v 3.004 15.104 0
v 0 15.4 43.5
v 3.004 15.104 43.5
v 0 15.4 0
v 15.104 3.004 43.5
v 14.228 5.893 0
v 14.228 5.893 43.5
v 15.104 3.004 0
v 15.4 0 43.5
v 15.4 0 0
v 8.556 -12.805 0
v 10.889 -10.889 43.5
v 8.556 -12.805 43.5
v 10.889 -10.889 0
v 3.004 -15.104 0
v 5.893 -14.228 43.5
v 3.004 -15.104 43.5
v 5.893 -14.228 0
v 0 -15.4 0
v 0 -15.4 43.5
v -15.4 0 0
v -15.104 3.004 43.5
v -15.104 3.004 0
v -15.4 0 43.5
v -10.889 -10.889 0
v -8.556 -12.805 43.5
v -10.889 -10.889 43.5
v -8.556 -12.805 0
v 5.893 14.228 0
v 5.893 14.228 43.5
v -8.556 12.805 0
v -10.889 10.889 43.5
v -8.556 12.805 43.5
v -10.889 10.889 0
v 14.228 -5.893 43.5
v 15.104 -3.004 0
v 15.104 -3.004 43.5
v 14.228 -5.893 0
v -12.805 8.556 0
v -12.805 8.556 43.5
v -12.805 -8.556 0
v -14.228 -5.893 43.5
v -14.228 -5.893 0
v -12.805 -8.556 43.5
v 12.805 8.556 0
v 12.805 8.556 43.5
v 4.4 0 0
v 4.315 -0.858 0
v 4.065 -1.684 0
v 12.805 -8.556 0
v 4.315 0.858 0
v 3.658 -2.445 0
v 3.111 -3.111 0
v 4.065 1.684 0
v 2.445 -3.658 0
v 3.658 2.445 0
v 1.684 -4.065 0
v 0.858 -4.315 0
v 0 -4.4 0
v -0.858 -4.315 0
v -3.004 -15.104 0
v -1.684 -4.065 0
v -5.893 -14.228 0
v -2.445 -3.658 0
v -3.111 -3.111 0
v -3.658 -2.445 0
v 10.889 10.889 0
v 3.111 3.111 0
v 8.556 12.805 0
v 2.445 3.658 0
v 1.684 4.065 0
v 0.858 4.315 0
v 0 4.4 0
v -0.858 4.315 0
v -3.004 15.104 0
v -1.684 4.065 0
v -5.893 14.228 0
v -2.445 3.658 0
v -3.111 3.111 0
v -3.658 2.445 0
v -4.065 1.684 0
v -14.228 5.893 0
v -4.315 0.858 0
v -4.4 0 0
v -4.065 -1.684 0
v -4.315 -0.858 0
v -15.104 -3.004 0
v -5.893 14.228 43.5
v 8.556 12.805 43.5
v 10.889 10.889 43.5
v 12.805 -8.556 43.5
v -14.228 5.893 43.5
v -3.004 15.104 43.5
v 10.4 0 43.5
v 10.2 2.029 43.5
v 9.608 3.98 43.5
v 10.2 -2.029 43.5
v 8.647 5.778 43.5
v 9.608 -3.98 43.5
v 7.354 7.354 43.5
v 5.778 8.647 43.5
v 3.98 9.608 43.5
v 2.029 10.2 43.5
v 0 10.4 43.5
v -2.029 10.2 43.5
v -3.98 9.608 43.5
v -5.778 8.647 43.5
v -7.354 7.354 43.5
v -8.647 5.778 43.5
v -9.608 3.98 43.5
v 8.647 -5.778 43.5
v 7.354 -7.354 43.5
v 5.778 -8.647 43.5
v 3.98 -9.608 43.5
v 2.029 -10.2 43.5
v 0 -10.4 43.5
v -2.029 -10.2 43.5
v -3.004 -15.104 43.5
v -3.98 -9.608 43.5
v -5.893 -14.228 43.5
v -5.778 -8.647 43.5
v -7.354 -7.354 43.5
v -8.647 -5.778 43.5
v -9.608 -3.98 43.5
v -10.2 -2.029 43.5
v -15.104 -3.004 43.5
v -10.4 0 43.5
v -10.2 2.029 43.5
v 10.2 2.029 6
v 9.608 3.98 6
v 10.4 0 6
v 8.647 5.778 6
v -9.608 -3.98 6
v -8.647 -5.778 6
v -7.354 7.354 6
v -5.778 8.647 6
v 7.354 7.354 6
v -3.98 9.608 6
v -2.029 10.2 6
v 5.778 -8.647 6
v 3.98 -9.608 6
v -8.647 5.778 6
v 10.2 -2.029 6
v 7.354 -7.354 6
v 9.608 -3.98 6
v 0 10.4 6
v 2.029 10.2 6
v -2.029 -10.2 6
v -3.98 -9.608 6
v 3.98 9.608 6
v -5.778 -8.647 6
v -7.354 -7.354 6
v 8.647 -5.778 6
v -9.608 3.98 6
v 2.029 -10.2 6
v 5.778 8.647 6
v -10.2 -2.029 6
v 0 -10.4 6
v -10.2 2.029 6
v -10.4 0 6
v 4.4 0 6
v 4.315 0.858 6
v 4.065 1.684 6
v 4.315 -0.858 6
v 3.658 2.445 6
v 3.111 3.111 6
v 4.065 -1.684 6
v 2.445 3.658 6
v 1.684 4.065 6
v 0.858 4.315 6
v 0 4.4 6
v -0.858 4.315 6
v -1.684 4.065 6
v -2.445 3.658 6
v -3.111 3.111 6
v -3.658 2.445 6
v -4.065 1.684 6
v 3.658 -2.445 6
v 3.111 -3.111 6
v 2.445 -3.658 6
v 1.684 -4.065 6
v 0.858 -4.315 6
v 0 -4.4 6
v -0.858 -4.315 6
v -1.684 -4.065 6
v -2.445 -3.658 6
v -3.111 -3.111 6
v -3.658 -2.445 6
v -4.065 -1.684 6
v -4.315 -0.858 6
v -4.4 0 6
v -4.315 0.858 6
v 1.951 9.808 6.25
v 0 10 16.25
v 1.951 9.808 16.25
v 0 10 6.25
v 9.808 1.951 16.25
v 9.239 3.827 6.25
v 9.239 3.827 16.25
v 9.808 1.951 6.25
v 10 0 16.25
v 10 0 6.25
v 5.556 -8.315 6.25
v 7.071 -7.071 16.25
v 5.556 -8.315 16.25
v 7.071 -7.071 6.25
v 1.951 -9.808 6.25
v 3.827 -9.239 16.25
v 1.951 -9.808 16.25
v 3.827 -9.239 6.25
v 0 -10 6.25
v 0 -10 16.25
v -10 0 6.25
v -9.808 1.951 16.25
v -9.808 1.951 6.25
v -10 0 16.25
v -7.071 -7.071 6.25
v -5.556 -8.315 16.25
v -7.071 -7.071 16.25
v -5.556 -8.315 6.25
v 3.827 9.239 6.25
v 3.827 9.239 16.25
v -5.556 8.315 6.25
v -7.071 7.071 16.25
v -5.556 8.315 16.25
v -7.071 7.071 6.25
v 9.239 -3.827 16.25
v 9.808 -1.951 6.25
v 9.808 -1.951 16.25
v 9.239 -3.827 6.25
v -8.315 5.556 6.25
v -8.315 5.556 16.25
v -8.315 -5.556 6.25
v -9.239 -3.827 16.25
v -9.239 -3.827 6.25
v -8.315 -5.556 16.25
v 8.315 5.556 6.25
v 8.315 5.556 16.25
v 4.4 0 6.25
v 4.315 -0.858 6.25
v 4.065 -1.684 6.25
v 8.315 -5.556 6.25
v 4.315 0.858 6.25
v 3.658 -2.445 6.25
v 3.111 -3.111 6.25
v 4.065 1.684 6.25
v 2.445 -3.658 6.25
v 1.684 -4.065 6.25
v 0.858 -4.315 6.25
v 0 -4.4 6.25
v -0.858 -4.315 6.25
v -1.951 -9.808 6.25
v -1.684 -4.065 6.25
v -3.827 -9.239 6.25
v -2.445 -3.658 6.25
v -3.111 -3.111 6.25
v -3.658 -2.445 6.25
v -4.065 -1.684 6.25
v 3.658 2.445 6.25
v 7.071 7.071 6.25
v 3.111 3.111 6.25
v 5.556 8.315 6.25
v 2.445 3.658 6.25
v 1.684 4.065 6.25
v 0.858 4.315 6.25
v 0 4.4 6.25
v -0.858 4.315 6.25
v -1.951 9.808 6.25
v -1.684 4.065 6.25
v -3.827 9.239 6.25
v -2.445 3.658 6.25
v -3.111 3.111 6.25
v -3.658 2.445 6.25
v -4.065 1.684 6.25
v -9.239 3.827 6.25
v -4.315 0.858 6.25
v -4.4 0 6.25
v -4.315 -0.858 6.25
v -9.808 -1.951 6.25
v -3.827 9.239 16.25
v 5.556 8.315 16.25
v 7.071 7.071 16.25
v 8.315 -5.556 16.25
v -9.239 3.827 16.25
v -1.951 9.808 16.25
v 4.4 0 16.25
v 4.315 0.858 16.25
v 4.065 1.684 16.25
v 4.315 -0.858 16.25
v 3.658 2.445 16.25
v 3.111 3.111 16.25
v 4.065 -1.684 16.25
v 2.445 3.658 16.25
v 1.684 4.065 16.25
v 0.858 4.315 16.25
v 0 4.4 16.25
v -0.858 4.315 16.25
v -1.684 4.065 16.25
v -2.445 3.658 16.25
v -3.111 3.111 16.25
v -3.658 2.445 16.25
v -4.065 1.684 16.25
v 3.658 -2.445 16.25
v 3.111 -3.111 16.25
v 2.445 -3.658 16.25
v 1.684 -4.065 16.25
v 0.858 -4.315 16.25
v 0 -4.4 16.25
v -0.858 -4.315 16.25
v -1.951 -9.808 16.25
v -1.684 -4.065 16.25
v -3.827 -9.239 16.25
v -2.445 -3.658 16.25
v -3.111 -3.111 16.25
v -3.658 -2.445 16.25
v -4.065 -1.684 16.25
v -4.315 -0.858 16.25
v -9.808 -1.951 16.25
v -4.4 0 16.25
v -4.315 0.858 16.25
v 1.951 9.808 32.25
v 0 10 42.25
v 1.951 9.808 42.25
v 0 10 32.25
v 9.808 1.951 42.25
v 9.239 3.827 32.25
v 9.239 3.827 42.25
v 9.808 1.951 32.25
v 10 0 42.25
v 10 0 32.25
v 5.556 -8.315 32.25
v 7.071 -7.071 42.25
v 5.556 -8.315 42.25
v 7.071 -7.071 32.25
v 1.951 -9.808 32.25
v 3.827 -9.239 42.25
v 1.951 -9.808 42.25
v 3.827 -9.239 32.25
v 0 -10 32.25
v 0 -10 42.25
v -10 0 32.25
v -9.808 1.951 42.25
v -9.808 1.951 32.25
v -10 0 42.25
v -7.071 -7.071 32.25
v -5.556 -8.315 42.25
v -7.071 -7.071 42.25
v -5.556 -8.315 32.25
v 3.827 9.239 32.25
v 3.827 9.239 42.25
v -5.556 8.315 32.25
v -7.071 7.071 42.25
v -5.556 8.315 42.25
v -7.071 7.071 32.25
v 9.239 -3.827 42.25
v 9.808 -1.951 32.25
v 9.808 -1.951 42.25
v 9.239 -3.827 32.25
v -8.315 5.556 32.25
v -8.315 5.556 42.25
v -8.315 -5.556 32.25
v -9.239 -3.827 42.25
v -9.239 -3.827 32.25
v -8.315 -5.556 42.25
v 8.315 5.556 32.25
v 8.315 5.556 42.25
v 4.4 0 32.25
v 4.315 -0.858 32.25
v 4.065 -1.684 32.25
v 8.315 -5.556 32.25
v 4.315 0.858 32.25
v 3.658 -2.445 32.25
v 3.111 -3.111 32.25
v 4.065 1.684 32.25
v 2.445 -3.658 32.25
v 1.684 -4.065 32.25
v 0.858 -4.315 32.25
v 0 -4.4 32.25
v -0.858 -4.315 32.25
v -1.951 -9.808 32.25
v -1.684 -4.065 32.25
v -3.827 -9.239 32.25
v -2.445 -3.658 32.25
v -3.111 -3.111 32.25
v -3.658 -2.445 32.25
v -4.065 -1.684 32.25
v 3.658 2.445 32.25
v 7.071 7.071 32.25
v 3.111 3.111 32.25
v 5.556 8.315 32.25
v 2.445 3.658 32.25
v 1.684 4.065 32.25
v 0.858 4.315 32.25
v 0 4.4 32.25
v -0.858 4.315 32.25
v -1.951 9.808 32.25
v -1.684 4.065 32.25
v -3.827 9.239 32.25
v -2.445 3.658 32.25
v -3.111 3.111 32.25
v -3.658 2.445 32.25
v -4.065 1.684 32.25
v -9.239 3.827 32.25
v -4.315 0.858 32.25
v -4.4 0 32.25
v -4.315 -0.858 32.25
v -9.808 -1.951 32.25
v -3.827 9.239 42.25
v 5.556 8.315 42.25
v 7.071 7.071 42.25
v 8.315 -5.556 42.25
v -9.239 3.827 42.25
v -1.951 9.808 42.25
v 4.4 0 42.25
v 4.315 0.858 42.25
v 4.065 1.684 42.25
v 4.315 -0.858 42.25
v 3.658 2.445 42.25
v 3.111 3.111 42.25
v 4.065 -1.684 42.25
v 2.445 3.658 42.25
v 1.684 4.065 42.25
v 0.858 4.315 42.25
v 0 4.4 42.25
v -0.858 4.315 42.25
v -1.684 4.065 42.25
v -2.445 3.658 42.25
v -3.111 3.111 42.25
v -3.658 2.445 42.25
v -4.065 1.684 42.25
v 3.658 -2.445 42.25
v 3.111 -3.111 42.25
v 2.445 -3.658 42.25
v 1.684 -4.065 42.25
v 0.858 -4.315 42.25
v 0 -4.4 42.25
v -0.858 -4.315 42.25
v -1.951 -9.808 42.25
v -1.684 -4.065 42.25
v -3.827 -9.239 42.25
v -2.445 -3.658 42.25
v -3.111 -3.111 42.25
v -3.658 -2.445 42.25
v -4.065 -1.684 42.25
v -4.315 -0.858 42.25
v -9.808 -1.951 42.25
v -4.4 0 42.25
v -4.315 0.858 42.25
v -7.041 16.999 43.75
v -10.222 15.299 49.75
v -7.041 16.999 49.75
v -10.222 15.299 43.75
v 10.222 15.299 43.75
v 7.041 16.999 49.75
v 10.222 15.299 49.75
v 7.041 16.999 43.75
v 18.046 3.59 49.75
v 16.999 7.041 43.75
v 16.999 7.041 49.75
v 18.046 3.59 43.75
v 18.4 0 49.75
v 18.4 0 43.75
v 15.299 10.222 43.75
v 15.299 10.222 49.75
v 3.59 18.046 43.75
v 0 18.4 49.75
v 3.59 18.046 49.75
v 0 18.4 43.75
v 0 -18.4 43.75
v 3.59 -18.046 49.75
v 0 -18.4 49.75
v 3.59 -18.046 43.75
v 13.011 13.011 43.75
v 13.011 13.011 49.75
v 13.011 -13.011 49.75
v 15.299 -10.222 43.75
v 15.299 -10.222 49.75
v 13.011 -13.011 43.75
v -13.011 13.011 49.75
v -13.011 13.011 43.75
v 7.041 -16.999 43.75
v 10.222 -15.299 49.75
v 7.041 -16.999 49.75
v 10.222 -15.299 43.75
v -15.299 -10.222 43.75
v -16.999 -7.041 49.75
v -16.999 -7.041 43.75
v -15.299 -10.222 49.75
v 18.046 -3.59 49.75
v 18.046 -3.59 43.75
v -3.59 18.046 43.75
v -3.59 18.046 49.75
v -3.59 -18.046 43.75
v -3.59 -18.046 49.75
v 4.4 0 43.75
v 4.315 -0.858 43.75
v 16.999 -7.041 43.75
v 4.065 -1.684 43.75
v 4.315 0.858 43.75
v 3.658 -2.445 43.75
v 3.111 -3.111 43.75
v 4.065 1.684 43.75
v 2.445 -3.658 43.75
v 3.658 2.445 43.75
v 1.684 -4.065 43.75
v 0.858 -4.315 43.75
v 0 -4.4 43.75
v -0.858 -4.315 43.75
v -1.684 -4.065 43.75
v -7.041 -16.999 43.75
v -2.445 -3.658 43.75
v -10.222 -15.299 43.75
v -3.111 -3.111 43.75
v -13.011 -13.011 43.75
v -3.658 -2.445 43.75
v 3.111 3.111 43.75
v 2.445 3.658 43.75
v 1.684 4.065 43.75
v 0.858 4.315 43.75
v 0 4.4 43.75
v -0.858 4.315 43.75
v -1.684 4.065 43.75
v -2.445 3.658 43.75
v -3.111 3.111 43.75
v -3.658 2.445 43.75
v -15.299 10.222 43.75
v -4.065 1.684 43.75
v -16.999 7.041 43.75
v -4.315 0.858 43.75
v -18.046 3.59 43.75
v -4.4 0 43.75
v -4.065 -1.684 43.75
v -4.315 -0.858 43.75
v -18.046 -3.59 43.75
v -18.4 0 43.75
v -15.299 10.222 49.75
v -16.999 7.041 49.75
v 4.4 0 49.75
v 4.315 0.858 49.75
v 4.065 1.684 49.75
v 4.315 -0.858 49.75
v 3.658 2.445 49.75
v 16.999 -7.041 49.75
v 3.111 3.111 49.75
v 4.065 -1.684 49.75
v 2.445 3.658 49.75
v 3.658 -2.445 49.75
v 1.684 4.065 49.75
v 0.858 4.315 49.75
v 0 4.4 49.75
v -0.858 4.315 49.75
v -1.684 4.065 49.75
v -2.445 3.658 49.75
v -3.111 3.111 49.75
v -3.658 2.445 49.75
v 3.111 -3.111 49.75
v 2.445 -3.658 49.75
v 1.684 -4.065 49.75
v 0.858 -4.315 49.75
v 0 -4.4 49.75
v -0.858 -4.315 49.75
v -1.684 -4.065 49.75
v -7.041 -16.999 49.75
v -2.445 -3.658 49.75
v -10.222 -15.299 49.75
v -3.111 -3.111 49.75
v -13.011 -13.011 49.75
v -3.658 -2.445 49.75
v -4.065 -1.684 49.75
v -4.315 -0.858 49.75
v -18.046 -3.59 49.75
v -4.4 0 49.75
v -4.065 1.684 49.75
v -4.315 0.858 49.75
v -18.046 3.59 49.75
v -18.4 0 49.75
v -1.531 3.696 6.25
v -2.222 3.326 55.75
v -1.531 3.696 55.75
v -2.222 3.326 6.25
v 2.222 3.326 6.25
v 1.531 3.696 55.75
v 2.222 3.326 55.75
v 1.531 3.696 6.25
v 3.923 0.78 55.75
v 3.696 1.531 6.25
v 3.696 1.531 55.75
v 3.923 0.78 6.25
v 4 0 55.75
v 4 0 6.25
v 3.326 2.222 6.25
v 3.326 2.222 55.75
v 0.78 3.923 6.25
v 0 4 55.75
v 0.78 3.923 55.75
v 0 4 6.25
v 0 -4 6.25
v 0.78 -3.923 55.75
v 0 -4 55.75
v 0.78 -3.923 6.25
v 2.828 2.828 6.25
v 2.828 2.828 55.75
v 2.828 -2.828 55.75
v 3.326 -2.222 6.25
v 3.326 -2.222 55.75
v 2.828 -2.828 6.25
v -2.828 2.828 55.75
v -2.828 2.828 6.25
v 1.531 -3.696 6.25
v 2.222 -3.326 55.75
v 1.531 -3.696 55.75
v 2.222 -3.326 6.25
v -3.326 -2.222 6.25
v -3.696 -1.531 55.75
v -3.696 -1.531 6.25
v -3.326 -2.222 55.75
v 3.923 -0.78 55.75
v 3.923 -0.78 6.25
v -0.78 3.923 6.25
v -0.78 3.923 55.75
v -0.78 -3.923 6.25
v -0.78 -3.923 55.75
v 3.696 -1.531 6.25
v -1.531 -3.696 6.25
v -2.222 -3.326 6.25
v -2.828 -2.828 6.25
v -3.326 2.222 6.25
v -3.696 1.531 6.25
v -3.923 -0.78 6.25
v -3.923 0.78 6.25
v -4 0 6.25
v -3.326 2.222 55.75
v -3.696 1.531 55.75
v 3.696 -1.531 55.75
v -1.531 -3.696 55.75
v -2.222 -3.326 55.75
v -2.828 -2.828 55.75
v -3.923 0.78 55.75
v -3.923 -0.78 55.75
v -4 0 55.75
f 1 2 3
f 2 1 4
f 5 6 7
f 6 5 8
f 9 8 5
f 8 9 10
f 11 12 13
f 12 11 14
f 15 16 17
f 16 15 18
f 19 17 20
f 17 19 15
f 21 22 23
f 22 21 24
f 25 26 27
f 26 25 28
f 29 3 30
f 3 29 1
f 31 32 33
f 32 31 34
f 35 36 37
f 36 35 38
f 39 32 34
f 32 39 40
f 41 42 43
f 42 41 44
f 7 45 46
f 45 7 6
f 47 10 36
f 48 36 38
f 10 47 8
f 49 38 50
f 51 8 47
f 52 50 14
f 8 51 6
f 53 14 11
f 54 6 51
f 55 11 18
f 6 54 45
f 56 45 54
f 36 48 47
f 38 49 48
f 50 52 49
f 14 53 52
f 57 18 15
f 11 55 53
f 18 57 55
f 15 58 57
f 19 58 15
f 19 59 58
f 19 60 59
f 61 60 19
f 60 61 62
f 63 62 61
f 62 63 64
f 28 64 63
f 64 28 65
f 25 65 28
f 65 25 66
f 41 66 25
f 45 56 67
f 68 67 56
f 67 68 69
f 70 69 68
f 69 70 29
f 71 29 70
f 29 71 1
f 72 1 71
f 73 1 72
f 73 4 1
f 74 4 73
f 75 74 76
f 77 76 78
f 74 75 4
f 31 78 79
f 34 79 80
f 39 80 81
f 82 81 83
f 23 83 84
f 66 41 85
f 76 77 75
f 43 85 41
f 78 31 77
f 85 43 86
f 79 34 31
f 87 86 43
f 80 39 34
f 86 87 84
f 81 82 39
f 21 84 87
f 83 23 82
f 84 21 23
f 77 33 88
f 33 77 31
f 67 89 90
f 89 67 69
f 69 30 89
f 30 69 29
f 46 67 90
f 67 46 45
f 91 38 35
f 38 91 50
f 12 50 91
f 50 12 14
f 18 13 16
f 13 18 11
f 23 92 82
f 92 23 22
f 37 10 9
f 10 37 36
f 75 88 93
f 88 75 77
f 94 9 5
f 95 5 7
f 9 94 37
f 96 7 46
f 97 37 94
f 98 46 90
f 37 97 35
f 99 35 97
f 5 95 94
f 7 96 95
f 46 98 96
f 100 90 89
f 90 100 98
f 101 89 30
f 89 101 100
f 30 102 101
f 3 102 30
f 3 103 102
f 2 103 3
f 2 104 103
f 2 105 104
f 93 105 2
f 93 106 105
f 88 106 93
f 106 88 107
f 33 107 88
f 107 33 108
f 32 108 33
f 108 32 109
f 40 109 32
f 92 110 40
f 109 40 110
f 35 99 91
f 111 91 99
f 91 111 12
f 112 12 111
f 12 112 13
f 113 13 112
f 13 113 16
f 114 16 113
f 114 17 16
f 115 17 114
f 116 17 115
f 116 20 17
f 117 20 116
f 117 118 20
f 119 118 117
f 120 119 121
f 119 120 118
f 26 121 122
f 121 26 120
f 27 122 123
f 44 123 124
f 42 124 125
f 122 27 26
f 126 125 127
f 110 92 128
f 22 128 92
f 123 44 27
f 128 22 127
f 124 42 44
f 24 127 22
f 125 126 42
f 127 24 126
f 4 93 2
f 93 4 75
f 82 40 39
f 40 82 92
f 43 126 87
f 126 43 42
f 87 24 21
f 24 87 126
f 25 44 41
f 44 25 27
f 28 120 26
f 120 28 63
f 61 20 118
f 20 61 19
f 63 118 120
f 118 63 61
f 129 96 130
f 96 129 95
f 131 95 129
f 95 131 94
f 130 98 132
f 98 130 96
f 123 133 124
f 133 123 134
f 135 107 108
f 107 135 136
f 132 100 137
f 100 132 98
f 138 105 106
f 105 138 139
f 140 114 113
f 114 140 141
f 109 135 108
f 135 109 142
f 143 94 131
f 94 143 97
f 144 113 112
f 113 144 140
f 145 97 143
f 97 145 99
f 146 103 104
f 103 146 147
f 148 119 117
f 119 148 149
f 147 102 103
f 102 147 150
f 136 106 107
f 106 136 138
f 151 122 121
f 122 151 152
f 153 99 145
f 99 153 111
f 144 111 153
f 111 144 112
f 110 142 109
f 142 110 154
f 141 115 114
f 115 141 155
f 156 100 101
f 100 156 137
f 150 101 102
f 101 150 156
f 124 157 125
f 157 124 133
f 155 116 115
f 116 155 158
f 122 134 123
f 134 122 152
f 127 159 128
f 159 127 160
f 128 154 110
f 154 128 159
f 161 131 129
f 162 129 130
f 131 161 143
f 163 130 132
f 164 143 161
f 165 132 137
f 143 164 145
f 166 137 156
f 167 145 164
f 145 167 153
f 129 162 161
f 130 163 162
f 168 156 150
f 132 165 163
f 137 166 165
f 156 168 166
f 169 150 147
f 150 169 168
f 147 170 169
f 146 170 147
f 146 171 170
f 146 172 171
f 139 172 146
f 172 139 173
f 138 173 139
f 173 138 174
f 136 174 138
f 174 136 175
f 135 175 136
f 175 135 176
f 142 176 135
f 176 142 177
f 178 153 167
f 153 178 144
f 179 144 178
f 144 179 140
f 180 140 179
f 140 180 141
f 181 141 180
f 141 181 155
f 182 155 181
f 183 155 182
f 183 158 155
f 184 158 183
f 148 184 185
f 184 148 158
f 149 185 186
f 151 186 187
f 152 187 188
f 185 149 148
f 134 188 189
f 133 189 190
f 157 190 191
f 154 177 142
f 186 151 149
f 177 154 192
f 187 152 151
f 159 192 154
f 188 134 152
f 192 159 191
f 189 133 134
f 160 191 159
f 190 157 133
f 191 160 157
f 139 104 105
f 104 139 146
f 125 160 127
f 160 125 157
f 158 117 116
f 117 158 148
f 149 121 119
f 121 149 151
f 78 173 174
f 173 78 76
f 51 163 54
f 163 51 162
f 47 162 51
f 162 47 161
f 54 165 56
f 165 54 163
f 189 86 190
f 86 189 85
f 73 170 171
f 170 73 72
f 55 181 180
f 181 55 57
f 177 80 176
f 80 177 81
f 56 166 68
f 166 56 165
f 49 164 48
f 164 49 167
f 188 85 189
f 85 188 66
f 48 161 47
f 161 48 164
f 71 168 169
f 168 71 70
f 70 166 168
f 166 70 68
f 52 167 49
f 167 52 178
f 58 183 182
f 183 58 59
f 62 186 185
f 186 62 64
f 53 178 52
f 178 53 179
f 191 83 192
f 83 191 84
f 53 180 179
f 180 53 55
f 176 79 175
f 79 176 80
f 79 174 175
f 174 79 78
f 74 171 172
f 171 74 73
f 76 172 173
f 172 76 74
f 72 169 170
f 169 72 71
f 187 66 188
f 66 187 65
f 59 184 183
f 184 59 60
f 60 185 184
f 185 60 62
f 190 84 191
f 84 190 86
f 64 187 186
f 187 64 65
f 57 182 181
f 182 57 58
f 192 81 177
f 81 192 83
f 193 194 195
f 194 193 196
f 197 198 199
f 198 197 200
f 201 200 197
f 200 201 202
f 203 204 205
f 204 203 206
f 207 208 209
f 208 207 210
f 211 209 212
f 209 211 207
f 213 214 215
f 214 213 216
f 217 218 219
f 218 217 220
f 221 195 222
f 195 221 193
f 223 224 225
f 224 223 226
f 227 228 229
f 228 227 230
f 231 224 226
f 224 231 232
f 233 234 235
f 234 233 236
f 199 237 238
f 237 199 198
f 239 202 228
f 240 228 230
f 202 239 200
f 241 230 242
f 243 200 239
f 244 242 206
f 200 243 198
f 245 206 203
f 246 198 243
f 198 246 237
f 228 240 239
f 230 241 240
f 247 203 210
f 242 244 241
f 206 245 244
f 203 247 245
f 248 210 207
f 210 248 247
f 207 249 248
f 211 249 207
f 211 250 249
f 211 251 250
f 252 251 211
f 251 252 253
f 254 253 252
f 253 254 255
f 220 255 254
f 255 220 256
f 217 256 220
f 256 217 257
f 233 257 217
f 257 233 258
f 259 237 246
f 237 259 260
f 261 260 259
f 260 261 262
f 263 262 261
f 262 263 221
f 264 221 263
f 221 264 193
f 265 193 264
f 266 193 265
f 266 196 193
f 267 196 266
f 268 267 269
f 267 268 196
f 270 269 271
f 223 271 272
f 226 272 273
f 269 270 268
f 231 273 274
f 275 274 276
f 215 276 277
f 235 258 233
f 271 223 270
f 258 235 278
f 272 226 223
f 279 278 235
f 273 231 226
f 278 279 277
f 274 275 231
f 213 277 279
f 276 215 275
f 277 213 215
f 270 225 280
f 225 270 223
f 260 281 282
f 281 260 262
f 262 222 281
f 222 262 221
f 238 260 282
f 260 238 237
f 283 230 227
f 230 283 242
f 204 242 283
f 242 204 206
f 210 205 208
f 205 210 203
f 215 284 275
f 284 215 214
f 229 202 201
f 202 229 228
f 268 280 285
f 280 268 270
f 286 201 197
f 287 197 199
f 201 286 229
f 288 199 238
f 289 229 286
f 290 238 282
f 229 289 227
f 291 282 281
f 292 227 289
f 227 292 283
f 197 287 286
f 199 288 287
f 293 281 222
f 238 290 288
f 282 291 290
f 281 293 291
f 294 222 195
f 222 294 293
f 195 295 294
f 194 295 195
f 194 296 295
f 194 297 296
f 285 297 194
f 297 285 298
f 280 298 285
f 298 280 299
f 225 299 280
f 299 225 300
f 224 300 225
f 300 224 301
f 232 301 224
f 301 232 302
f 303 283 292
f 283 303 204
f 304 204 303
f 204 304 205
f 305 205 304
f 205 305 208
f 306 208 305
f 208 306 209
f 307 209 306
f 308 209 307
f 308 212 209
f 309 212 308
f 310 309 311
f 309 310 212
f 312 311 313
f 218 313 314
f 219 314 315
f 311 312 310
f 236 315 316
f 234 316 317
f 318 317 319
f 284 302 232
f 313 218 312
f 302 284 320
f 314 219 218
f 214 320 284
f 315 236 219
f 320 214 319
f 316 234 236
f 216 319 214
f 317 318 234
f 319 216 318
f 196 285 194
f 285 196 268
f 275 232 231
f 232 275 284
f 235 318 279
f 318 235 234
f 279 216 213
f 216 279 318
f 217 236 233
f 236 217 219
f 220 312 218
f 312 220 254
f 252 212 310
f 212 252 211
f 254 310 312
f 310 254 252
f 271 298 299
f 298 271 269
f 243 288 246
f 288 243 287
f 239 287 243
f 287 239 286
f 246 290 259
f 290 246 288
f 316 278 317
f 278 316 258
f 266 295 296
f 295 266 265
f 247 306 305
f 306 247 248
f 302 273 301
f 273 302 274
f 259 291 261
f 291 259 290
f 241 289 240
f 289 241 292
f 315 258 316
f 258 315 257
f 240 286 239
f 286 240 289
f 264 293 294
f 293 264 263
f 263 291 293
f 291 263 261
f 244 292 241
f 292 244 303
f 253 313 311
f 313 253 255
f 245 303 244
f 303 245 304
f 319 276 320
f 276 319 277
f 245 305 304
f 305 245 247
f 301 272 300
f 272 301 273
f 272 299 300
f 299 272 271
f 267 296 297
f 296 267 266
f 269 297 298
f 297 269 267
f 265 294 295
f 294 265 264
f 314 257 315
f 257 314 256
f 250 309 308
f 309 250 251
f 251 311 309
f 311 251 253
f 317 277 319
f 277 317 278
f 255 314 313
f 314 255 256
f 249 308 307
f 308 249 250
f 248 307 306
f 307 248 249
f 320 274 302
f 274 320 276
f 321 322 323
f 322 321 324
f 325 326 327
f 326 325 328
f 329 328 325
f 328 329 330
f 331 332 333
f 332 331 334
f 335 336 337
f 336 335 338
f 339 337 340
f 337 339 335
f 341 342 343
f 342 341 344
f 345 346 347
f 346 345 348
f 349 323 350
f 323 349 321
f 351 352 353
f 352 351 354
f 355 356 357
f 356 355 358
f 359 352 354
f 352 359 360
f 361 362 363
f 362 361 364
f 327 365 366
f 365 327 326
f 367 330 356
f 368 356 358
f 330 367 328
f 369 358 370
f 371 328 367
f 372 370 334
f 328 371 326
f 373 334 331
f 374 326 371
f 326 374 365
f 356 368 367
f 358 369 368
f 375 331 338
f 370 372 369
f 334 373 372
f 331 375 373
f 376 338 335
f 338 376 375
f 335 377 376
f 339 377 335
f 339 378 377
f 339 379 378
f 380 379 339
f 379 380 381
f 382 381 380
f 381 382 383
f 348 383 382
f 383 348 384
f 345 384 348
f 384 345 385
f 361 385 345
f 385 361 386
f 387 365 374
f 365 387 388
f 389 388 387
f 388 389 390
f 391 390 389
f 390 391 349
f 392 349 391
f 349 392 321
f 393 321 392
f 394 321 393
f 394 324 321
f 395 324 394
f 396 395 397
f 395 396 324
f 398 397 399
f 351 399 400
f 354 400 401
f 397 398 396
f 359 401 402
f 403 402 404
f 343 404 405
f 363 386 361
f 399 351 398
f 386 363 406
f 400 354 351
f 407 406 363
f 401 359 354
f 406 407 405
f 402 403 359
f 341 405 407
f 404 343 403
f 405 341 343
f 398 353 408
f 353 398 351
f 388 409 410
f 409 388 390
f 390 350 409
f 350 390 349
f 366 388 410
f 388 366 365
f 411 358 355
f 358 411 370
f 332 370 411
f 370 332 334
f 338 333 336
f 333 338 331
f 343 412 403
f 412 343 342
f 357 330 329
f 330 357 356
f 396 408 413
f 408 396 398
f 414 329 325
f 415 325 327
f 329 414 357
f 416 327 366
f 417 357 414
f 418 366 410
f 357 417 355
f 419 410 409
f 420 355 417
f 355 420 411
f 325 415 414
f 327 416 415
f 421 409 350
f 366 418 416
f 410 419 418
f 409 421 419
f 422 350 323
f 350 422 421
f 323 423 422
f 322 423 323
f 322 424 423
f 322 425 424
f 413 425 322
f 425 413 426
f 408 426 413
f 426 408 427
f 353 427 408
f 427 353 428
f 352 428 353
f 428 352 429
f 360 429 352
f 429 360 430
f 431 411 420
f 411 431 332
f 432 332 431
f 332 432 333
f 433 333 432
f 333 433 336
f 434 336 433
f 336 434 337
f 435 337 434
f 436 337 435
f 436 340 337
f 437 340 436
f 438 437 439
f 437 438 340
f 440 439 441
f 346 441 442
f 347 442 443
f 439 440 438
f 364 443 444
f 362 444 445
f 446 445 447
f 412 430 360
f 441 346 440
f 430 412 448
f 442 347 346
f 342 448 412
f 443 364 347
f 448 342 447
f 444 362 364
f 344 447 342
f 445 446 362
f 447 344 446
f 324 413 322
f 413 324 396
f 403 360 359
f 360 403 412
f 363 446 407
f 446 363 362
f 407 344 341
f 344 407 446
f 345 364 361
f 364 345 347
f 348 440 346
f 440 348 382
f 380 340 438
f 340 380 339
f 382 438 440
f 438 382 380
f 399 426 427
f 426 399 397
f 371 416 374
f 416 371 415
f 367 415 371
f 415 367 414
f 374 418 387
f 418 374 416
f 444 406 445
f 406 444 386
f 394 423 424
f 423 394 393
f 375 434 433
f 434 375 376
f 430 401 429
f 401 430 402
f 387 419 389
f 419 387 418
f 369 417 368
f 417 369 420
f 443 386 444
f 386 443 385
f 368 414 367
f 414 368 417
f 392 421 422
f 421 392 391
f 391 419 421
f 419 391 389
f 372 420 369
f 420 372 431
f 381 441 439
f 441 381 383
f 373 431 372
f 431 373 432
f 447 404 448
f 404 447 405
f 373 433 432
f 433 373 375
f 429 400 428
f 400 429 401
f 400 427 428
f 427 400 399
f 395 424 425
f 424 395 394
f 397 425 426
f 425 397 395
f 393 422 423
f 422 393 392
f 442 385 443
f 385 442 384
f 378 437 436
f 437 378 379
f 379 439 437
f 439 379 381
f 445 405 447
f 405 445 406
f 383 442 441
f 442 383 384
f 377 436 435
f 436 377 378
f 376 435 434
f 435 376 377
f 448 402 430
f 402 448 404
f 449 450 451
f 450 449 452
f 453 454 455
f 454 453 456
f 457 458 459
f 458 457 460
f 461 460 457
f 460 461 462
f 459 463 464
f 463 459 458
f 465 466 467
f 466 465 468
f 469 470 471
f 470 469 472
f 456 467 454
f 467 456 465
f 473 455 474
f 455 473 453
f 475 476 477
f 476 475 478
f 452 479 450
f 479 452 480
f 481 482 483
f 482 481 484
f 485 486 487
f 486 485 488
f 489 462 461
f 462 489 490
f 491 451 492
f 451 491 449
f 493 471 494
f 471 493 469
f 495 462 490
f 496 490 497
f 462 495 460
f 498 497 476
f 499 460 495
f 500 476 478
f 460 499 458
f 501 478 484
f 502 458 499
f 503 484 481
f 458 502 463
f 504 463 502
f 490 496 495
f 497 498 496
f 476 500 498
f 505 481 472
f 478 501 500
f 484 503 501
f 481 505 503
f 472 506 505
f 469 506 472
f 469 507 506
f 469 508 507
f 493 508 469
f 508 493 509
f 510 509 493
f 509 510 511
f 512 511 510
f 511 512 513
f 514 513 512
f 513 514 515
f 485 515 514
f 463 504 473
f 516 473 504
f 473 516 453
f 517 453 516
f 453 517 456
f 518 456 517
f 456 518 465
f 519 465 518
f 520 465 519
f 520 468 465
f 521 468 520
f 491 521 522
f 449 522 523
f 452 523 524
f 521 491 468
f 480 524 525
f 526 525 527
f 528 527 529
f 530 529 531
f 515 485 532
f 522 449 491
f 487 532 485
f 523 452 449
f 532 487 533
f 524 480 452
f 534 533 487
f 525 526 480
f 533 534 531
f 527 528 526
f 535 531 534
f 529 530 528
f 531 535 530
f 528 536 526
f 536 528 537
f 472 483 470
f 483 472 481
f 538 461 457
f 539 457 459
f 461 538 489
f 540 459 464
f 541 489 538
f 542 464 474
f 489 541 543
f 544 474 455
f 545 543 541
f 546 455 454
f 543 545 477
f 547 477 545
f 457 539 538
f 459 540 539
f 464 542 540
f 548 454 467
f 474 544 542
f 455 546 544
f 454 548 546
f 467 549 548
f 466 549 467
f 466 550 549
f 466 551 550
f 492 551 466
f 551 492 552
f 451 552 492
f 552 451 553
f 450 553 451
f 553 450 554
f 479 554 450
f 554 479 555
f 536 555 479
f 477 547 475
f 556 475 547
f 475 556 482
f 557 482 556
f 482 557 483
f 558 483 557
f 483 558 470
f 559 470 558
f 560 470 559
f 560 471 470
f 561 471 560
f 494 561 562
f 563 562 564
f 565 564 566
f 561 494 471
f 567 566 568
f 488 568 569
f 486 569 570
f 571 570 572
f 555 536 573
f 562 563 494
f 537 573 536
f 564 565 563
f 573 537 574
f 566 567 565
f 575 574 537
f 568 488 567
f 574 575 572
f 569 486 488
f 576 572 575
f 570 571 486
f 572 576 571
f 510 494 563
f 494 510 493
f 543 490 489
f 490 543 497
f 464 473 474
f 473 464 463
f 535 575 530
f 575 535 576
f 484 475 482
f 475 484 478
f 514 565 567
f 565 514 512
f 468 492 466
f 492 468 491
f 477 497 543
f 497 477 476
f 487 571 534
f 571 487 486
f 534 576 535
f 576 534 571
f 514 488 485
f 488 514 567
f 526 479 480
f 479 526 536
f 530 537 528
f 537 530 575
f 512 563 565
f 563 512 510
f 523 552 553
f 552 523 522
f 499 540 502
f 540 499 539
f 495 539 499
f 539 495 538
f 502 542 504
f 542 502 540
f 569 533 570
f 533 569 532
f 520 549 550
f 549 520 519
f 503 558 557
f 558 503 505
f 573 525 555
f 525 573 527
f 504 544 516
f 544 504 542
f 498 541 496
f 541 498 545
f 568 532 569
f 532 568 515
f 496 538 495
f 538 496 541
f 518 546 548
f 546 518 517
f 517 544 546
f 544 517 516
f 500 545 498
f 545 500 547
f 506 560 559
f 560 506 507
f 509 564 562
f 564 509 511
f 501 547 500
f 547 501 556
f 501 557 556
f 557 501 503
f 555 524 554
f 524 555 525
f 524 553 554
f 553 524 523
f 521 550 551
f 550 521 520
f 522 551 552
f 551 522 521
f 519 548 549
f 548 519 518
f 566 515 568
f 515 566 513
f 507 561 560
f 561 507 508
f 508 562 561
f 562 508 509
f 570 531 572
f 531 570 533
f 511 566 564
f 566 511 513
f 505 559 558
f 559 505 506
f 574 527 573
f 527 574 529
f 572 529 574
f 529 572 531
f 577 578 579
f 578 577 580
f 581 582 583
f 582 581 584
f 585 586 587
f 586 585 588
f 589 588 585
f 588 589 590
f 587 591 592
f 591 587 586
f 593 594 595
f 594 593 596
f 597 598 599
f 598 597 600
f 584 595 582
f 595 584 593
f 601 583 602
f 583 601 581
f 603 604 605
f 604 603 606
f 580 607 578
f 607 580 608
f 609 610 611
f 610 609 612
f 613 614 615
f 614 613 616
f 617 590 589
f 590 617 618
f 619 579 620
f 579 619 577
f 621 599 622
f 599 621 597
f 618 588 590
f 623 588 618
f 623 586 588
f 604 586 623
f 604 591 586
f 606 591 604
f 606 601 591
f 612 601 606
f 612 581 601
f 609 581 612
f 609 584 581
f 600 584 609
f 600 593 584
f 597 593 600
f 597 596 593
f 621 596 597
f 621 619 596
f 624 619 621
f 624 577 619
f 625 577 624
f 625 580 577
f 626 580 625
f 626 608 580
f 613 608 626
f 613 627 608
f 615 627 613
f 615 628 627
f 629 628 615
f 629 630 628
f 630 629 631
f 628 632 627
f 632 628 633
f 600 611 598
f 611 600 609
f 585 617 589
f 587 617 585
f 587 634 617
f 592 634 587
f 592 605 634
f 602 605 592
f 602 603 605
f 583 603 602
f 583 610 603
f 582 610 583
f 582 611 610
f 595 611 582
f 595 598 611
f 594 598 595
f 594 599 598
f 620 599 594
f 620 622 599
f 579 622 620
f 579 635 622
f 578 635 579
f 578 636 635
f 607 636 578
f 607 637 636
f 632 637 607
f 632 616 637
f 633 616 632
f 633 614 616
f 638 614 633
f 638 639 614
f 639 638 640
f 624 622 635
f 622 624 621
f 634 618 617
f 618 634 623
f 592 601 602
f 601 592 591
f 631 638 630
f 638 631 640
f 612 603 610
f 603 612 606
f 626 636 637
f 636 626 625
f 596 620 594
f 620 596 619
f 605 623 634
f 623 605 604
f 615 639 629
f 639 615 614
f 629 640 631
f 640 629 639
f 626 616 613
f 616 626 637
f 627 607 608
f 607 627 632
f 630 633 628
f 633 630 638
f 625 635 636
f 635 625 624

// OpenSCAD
$fn = 32;

// ------------------------------------------------------------------------
// Shaft station: cup d30.8 x 43.5 mm, shaft d8
// Every part is its own module, assembly() places every instance.
// ------------------------------------------------------------------------

// --- part 1 ---
module housing_cup() {
  difference() {
    cylinder(h = 43.5, d = 30.8);
    translate([0, 0, 6]) cylinder(h = 38.5, d = 20.8);
    translate([0, 0, -1]) cylinder(h = 8, d = 8.8);
  }
}

// --- part 2 ---
module bearing_lower() {
  difference() {
      translate([0, 0, 0]) cylinder(h = 10, d = 20);
      translate([0, 0, -1]) cylinder(h = 12, d = 8.8);
    }
}

// --- part 3 ---
module bearing_upper() {
  difference() {
      translate([0, 0, 0]) cylinder(h = 10, d = 20);
      translate([0, 0, -1]) cylinder(h = 12, d = 8.8);
    }
}

// --- part 4 ---
module station_shaft() {
  translate([0, 0, -24.75]) cylinder(h = 49.5, d = 8);
}

// --- part 5 ---
module station_cover() {
  difference() {
    cylinder(h = 6, d = 36.8);
    translate([0, 0, -1]) cylinder(h = 8, d = 8.8);
  }
}

// --- assembly ---
module assembly() {
  color([0.80, 0.24, 0.20]) translate([0, 0, 0]) rotate([0, 0, 0]) housing_cup();
  color([0.20, 0.45, 0.75]) translate([0, 0, 6.25]) rotate([0, 0, 0]) bearing_lower();
  color([0.25, 0.62, 0.32]) translate([0, 0, 32.25]) rotate([0, 0, 0]) bearing_upper();
  color([0.92, 0.70, 0.18]) translate([0, 0, 31]) rotate([0, 0, 0]) station_shaft();
  color([0.58, 0.35, 0.70]) translate([0, 0, 43.75]) rotate([0, 0, 0]) station_cover();
}

assembly();
